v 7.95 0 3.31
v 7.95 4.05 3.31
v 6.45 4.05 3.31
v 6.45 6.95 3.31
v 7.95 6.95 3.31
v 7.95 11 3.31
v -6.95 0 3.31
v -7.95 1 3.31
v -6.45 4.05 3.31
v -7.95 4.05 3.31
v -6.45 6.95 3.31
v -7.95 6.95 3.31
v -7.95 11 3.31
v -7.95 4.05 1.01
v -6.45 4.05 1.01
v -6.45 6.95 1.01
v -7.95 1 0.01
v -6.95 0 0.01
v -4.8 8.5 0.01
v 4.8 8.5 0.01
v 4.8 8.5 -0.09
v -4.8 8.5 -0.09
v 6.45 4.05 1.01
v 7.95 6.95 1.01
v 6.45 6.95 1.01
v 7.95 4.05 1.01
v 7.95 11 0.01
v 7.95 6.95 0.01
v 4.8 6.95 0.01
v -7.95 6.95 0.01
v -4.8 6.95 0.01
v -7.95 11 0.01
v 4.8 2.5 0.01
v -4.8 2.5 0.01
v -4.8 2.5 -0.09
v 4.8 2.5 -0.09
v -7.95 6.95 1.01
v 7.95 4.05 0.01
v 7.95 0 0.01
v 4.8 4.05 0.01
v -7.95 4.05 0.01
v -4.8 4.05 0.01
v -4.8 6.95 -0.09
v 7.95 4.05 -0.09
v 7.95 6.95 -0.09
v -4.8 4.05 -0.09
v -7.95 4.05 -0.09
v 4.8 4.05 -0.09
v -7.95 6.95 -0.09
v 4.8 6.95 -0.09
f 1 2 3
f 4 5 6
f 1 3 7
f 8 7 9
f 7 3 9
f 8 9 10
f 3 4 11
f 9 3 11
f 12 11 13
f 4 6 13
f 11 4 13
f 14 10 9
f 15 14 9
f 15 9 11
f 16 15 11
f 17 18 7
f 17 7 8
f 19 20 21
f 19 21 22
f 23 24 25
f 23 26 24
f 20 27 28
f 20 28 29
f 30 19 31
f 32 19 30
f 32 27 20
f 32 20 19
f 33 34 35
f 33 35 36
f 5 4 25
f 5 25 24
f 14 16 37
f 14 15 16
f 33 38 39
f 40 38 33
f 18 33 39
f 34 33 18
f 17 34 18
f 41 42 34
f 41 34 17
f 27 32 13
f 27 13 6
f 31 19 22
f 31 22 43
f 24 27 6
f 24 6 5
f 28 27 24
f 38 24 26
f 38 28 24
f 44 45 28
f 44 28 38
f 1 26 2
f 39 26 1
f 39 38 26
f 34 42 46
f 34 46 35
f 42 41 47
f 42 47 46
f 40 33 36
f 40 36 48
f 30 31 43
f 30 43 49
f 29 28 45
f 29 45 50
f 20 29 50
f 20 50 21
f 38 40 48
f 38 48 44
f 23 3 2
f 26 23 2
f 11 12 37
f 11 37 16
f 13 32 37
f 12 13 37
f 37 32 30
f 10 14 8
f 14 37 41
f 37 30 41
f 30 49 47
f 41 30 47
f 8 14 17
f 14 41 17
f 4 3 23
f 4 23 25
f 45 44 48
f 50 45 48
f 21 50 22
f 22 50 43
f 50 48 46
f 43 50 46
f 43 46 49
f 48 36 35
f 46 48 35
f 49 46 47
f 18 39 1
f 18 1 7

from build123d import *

# Parameters (mm, degrees)
PAD001_DEPTH      = 3.3
SKETCH002_W       = 1.5
SKETCH002_H       = 2.9
POCKET_DEPTH      = 5
PAD002_DEPTH      = 0.1
PAD002_DEPTH_BACK = 1


with BuildPart() as part:
    # Sketch001 → Pad001 (new body)
    with BuildSketch(Plane.XY.offset(0.01)):
        Polygon((-7.95, 11), (7.95, 11), (7.95, 0), (-6.95, 0), (-7.95, 1), align=None)
    extrude(amount=PAD001_DEPTH)

    # Sketch002 → Pocket (cut)
    with BuildSketch(Plane.XY.offset(3.31)):
        with Locations((-7.2, 5.5)):
            Rectangle(SKETCH002_W, SKETCH002_H)
        with Locations((7.2, 5.5)):
            Rectangle(SKETCH002_W, SKETCH002_H)
    extrude(amount=-POCKET_DEPTH, mode=Mode.SUBTRACT)

    # Sketch003 → Pad002 (new body, two sides)
    with BuildSketch(Plane(origin=(0, 0, 0.01), x_dir=(1, 0, 0), z_dir=(0, 0, -1))) as pad002_sk:
        Polygon((-7.95, -6.95), (-7.95, -4.05), (-4.8, -4.05), (-4.8, -2.5), (4.8, -2.5), (4.8, -4.05), (7.95, -4.05), (7.95, -6.95), (4.8, -6.95), (4.8, -8.5), (-4.8, -8.5), (-4.8, -6.95), align=None)
    extrude(amount=PAD002_DEPTH)
    extrude(pad002_sk.sketch, amount=-PAD002_DEPTH_BACK)


solid = part.part
